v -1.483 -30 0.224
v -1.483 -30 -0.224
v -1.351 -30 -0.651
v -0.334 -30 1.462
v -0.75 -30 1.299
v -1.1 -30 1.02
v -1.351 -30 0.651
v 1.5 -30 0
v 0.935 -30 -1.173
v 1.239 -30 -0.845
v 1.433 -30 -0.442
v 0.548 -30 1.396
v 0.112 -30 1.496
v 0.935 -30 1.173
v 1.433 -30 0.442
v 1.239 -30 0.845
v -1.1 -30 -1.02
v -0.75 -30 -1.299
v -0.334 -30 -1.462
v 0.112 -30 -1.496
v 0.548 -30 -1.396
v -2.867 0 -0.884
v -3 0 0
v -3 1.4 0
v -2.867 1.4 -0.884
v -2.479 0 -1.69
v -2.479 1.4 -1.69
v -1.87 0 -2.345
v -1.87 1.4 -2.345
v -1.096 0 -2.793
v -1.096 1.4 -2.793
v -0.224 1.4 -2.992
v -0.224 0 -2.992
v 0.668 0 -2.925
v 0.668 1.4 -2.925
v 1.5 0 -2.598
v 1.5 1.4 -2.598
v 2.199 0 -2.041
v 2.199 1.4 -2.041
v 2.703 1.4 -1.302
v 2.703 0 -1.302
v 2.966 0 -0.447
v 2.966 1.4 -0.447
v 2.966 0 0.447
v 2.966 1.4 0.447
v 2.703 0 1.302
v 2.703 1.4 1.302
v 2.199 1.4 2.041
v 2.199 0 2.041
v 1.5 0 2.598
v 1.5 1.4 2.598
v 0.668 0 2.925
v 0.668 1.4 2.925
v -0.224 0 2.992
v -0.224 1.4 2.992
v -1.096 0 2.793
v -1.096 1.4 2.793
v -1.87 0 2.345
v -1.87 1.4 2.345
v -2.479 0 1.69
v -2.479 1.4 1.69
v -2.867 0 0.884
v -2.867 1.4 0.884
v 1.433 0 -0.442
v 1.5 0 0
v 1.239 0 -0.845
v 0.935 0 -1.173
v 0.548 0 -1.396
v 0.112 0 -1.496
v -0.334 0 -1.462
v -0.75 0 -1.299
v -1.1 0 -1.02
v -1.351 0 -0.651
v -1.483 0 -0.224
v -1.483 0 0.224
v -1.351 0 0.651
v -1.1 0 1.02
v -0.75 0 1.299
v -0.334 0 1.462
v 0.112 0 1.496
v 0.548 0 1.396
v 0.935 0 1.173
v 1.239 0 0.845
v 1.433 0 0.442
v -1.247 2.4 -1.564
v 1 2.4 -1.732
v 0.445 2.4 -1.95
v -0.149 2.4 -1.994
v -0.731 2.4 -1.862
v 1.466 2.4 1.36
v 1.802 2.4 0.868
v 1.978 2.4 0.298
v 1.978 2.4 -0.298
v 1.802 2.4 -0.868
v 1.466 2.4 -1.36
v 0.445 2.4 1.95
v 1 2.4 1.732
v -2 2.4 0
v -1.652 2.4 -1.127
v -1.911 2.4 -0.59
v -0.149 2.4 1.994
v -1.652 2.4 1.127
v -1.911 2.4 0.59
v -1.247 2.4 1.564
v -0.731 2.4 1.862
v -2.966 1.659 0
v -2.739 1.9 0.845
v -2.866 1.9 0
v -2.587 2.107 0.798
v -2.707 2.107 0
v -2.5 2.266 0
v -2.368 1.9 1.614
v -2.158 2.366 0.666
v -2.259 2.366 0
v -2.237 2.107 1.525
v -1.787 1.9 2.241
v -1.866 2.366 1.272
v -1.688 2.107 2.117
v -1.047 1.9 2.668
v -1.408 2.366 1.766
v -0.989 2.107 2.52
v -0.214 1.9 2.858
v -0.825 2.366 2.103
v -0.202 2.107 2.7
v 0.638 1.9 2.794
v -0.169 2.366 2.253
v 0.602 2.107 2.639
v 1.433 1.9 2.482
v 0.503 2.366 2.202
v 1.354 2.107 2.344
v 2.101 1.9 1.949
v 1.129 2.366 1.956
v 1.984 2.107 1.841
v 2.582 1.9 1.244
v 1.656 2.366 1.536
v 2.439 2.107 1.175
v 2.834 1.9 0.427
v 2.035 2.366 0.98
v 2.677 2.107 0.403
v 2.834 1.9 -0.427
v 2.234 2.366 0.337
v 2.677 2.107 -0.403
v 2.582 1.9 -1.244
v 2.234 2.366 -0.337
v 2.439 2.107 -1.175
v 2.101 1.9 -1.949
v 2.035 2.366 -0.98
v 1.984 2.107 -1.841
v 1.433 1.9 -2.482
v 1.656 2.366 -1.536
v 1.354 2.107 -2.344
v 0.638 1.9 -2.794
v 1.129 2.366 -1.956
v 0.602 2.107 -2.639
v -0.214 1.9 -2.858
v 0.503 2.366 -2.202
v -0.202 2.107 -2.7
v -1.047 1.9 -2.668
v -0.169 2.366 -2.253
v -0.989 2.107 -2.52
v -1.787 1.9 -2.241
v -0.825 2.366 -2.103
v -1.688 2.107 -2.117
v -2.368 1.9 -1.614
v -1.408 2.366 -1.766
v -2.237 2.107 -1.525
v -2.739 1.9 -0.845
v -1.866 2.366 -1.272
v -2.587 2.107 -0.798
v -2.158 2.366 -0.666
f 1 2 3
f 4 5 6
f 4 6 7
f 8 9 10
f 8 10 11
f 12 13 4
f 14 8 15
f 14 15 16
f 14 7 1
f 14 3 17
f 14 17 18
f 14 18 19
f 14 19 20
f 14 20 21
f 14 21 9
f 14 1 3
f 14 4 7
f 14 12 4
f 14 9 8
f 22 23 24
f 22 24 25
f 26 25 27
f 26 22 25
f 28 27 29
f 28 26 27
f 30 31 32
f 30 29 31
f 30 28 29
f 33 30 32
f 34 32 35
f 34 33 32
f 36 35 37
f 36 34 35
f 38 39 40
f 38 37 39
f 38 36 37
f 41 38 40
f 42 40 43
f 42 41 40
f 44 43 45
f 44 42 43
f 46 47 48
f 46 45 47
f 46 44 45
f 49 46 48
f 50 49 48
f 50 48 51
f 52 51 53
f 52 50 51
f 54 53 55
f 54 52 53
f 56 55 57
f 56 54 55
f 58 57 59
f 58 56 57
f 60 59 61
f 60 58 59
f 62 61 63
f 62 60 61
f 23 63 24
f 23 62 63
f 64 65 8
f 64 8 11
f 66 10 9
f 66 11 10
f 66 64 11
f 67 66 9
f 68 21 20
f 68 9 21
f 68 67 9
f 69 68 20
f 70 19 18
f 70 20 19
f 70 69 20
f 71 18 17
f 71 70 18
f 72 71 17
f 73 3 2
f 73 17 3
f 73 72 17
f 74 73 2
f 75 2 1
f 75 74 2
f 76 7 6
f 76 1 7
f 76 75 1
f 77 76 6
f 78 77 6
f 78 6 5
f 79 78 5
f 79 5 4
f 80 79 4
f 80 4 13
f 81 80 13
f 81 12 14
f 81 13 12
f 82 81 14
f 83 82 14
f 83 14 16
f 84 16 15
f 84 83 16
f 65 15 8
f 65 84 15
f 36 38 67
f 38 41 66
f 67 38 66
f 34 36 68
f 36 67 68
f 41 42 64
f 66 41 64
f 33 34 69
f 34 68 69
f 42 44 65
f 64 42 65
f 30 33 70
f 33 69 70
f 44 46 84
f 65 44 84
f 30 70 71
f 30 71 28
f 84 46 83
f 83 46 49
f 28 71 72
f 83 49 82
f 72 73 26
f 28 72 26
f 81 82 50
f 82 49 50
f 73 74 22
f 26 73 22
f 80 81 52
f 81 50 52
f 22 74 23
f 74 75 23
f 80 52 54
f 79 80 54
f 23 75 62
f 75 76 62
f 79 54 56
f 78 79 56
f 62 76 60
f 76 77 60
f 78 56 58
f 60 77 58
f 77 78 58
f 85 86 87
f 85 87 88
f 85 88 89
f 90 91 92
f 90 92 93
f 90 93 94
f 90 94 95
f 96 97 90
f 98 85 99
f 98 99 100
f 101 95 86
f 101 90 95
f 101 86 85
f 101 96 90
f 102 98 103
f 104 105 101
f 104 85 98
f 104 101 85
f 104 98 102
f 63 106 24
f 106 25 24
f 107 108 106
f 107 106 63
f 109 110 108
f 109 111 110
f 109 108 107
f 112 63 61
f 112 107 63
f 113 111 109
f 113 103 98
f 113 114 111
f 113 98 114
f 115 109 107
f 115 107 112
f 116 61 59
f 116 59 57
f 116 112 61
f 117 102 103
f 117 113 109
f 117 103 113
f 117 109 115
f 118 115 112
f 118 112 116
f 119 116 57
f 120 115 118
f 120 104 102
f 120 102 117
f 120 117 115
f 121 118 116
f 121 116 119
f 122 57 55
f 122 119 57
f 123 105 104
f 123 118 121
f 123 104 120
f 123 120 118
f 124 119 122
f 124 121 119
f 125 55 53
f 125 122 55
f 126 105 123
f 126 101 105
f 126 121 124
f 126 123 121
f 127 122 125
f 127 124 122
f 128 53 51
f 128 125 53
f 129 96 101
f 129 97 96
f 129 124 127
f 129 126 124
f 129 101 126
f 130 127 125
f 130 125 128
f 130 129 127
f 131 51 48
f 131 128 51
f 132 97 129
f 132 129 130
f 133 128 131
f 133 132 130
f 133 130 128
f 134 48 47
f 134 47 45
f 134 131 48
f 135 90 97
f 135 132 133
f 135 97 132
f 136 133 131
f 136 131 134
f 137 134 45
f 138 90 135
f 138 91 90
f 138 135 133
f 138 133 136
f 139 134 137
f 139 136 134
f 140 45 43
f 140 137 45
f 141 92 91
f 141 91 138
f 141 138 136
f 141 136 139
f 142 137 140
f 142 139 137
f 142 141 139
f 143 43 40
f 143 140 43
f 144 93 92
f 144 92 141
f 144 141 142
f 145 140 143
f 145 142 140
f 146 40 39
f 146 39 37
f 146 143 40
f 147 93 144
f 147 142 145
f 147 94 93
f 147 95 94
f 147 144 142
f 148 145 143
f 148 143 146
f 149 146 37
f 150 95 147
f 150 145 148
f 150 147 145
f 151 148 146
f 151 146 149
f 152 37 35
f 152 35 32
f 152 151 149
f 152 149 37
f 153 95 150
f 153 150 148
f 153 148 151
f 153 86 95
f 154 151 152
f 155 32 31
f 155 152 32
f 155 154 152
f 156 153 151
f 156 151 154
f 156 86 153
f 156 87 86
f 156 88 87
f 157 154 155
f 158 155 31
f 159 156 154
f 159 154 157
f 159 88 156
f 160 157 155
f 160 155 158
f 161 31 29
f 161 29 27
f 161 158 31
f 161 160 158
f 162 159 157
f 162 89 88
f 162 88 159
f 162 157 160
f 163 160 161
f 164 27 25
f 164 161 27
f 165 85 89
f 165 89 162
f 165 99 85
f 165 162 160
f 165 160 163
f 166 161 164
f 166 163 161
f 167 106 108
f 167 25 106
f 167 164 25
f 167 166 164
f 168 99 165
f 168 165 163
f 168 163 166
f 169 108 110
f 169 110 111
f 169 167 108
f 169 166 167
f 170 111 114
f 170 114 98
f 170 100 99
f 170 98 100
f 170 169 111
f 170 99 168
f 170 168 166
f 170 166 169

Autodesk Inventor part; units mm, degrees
ref_plane "YZ Plane" through (0, 0, 0) normal (1, 0, 0) x (0, 1, 0)
ref_plane "XZ Plane" through (0, 0, 0) normal (0, 1, 0) x (-1, 0, 0)
ref_plane "XY Plane" through (0, 0, 0) normal (0, 0, 1) x (1, 0, 0)
sketch "Esboço1" plane through (0, 0, 0) normal (0, 1, 0) x (-1, 0, 0)
  circle A0 centre (0, 0) radius 3
  dimension "d0" = 6
extrude "Extrusão1" add sketch "Esboço1" along normal blind 2.4
sketch "Esboço2" plane through (0, 0, 0) normal (0, -1, 0) x (1, 0, 0)
  circle A0 centre (0, 0) radius 1.5
  dimension "d3" = 3
extrude "Extrusão2" add sketch "Esboço2" along normal blind 30
thread "Rosca1" size "M3x0.5" class "6g" standard "ANSI Metric M Profile" full length
fillet "Arredondamento1" radius 1 1 edges at (3, 2.4, 0)
properties part number "Parafuso m3x25"
